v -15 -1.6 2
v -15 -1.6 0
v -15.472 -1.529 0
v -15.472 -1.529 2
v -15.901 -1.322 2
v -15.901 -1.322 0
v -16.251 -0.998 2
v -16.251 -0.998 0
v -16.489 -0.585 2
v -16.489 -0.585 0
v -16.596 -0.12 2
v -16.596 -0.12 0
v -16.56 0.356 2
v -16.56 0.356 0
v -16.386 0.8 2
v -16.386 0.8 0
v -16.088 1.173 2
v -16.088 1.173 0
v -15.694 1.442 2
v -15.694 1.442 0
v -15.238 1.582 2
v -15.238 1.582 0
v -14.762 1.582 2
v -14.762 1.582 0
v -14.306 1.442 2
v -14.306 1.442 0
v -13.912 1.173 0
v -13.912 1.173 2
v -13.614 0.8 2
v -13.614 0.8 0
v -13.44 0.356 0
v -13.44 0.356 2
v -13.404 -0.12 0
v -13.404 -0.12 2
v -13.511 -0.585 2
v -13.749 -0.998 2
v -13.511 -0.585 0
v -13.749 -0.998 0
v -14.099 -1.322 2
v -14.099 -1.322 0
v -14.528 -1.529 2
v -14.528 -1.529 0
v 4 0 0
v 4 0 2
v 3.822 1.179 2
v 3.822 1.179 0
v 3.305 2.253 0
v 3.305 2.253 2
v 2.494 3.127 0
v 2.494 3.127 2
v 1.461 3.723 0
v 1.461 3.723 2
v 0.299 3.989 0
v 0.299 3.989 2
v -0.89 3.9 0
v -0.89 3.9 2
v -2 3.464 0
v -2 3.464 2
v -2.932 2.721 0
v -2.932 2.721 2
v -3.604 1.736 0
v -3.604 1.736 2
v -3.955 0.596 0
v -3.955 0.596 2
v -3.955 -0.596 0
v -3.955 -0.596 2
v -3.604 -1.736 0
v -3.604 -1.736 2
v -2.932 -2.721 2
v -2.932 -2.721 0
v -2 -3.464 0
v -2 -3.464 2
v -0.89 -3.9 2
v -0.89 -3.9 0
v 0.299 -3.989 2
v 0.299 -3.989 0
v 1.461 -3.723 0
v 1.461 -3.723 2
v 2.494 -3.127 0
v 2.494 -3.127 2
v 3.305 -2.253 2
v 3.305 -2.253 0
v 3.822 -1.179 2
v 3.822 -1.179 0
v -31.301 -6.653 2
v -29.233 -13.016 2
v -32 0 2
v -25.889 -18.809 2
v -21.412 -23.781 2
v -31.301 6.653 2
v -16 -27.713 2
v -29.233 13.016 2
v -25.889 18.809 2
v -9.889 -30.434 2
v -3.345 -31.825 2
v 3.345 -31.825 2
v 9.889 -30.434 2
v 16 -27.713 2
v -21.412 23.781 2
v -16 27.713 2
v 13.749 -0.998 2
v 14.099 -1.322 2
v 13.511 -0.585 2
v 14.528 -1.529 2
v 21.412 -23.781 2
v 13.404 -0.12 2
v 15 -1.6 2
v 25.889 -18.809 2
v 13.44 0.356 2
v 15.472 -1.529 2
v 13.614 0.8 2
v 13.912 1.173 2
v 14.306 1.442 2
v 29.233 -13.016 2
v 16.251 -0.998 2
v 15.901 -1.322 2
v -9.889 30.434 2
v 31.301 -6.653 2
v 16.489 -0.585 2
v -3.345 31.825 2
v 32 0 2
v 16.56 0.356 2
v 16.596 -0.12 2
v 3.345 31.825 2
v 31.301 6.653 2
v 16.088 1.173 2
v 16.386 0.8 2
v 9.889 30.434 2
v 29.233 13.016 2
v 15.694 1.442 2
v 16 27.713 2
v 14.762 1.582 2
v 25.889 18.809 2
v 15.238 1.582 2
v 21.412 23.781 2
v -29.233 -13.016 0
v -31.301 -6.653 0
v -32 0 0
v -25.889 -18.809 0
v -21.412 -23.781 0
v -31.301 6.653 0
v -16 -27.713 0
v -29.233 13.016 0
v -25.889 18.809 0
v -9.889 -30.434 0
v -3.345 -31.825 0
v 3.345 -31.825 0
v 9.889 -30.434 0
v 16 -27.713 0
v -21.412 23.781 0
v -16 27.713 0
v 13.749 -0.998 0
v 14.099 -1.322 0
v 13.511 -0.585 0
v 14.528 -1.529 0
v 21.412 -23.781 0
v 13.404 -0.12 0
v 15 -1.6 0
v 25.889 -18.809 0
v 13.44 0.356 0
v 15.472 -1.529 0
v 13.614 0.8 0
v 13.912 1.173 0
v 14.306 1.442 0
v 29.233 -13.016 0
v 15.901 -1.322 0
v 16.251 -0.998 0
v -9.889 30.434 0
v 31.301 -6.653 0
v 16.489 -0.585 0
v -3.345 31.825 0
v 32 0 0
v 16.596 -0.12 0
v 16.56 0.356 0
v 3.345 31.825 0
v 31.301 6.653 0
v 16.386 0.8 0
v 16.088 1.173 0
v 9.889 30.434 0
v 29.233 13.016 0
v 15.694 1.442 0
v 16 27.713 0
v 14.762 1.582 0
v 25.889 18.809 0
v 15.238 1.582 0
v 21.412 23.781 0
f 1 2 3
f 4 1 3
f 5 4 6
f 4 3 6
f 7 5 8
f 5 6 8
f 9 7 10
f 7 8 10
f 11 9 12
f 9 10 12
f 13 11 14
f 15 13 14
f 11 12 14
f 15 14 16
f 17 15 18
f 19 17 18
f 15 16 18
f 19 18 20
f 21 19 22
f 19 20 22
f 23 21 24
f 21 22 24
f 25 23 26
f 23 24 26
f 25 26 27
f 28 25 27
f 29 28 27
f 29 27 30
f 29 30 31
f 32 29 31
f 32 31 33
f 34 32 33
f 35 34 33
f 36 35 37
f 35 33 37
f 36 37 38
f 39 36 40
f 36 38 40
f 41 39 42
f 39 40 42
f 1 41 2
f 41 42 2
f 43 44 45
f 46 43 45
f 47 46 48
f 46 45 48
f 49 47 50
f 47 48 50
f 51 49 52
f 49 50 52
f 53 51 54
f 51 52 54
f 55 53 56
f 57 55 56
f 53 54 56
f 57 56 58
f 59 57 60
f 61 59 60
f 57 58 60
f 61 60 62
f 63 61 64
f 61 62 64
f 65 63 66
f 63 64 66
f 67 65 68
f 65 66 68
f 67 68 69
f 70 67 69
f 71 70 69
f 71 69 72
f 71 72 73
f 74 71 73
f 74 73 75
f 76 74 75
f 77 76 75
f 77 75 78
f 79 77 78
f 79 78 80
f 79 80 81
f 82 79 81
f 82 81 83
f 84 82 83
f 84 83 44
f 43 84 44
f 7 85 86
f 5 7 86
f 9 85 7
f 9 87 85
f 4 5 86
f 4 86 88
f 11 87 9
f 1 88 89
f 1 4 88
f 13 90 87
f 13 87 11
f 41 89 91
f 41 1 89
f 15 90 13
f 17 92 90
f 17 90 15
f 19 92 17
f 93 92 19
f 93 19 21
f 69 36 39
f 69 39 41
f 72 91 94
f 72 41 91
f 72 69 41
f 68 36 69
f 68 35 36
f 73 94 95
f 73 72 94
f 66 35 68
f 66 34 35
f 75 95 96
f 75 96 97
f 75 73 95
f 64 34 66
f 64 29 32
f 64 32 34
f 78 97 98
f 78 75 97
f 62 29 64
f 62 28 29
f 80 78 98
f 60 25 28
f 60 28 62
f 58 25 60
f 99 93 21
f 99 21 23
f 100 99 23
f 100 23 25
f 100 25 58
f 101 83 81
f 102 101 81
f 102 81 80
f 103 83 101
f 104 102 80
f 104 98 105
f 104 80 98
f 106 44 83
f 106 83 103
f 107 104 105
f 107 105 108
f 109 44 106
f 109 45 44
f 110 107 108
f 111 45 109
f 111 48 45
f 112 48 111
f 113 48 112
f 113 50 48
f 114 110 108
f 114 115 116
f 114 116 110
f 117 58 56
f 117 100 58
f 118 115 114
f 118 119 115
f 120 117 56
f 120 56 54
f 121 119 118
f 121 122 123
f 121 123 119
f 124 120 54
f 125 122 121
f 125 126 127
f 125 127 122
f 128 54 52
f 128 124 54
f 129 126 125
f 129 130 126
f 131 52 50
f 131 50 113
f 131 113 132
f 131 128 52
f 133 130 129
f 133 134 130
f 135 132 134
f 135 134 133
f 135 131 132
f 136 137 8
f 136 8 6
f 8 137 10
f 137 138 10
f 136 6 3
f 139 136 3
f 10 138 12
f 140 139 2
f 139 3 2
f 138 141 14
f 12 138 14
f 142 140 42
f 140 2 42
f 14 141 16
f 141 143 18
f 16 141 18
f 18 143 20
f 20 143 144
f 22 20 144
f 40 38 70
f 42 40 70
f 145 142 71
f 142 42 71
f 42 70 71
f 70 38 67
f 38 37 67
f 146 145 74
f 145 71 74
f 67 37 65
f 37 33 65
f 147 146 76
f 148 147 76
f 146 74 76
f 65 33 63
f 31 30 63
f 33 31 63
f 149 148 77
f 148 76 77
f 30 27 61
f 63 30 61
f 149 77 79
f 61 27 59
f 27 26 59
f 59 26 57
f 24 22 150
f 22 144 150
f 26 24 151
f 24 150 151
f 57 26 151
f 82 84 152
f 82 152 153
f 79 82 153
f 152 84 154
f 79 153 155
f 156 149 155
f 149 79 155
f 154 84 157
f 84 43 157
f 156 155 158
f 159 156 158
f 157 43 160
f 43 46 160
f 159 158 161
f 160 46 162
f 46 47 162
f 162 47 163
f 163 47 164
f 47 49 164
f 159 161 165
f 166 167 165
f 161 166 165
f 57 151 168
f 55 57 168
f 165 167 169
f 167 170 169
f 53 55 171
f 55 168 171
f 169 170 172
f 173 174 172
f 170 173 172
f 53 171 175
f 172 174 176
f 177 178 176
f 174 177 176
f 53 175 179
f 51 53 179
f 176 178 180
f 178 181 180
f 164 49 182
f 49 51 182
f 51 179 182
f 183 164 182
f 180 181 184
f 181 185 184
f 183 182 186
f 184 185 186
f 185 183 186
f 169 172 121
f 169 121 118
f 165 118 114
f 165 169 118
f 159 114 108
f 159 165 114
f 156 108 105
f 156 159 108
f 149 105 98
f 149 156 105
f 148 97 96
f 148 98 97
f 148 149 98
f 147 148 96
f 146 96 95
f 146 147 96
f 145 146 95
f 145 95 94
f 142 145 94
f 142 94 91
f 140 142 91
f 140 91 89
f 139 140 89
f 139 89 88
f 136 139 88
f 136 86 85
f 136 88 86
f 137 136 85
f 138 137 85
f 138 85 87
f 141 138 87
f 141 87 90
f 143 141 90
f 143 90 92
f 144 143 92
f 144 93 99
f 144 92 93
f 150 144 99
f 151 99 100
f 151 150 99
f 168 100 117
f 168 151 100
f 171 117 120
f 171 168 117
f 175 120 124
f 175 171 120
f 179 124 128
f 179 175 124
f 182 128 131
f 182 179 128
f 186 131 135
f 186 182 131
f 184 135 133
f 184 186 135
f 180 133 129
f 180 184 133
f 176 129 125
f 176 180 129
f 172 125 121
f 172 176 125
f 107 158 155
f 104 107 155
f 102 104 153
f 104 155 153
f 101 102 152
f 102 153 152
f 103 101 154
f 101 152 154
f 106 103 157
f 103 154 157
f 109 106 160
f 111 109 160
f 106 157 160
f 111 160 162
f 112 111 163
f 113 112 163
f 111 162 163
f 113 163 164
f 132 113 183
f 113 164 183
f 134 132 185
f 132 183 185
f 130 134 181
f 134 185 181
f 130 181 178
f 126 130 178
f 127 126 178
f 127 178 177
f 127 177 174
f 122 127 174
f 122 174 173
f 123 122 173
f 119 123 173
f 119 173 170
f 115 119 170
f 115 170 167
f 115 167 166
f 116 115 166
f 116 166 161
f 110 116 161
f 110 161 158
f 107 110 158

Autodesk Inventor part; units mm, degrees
ref_plane "YZ Plane" through (0, 0, 0) normal (1, 0, 0) x (0, 1, 0)
ref_plane "XZ Plane" through (0, 0, 0) normal (0, 1, 0) x (-1, 0, 0)
ref_plane "XY Plane" through (0, 0, 0) normal (0, 0, 1) x (1, 0, 0)
sketch "スケッチ1" plane through (0, 0, 0) normal (0, 0, 1) x (1, 0, 0)
  circle A0 centre (0, 0) radius 32
  dimension "d0" = 64
extrude "押し出し1" add sketch "スケッチ1" along normal blind 2
sketch "スケッチ2" plane through (0, 0, 2) normal (0, 0, 1) x (1, 0, 0)
  circle A0 centre (-15, 0) radius 1.6
  circle A1 centre (15, 0) radius 1.6
  point P0 (0, 0)
  dimension "d3" = 3.2
  dimension "d4" = 3.2
  dimension "d5" = 15
  dimension "d6" = 15
hole "穴1" at (-15, 0, 2) at (15, 0, 2) direction (0, 0, -1) diameter 3.2 depth 2
sketch "スケッチ3" plane through (0, 0, 2) normal (0, 0, 1) x (1, 0, 0)
  circle A0 centre (0, 0) radius 4
  dimension "d14" = 8
extrude "押し出し2" cut sketch "スケッチ3" against normal blind 2
equation "\"BendRadius\" = Thickness"
equation "\"BendReliefWidth\" = Thickness"
equation "\"BendReliefDepth\" = 0.5 * Thickness"
equation "\"CornerReliefSize\" = 4 * Thickness"
equation "\"MinimumRemnant\" = 2 * Thickness"
equation "\"TransitionRadius\" = BendRadius"
equation "\"JacobiRadiusSize\" = BendRadius"
equation "\"GapSize\" = Thickness"
equation "\"Thickness\" = 0.5"
properties part number "nhk34"
